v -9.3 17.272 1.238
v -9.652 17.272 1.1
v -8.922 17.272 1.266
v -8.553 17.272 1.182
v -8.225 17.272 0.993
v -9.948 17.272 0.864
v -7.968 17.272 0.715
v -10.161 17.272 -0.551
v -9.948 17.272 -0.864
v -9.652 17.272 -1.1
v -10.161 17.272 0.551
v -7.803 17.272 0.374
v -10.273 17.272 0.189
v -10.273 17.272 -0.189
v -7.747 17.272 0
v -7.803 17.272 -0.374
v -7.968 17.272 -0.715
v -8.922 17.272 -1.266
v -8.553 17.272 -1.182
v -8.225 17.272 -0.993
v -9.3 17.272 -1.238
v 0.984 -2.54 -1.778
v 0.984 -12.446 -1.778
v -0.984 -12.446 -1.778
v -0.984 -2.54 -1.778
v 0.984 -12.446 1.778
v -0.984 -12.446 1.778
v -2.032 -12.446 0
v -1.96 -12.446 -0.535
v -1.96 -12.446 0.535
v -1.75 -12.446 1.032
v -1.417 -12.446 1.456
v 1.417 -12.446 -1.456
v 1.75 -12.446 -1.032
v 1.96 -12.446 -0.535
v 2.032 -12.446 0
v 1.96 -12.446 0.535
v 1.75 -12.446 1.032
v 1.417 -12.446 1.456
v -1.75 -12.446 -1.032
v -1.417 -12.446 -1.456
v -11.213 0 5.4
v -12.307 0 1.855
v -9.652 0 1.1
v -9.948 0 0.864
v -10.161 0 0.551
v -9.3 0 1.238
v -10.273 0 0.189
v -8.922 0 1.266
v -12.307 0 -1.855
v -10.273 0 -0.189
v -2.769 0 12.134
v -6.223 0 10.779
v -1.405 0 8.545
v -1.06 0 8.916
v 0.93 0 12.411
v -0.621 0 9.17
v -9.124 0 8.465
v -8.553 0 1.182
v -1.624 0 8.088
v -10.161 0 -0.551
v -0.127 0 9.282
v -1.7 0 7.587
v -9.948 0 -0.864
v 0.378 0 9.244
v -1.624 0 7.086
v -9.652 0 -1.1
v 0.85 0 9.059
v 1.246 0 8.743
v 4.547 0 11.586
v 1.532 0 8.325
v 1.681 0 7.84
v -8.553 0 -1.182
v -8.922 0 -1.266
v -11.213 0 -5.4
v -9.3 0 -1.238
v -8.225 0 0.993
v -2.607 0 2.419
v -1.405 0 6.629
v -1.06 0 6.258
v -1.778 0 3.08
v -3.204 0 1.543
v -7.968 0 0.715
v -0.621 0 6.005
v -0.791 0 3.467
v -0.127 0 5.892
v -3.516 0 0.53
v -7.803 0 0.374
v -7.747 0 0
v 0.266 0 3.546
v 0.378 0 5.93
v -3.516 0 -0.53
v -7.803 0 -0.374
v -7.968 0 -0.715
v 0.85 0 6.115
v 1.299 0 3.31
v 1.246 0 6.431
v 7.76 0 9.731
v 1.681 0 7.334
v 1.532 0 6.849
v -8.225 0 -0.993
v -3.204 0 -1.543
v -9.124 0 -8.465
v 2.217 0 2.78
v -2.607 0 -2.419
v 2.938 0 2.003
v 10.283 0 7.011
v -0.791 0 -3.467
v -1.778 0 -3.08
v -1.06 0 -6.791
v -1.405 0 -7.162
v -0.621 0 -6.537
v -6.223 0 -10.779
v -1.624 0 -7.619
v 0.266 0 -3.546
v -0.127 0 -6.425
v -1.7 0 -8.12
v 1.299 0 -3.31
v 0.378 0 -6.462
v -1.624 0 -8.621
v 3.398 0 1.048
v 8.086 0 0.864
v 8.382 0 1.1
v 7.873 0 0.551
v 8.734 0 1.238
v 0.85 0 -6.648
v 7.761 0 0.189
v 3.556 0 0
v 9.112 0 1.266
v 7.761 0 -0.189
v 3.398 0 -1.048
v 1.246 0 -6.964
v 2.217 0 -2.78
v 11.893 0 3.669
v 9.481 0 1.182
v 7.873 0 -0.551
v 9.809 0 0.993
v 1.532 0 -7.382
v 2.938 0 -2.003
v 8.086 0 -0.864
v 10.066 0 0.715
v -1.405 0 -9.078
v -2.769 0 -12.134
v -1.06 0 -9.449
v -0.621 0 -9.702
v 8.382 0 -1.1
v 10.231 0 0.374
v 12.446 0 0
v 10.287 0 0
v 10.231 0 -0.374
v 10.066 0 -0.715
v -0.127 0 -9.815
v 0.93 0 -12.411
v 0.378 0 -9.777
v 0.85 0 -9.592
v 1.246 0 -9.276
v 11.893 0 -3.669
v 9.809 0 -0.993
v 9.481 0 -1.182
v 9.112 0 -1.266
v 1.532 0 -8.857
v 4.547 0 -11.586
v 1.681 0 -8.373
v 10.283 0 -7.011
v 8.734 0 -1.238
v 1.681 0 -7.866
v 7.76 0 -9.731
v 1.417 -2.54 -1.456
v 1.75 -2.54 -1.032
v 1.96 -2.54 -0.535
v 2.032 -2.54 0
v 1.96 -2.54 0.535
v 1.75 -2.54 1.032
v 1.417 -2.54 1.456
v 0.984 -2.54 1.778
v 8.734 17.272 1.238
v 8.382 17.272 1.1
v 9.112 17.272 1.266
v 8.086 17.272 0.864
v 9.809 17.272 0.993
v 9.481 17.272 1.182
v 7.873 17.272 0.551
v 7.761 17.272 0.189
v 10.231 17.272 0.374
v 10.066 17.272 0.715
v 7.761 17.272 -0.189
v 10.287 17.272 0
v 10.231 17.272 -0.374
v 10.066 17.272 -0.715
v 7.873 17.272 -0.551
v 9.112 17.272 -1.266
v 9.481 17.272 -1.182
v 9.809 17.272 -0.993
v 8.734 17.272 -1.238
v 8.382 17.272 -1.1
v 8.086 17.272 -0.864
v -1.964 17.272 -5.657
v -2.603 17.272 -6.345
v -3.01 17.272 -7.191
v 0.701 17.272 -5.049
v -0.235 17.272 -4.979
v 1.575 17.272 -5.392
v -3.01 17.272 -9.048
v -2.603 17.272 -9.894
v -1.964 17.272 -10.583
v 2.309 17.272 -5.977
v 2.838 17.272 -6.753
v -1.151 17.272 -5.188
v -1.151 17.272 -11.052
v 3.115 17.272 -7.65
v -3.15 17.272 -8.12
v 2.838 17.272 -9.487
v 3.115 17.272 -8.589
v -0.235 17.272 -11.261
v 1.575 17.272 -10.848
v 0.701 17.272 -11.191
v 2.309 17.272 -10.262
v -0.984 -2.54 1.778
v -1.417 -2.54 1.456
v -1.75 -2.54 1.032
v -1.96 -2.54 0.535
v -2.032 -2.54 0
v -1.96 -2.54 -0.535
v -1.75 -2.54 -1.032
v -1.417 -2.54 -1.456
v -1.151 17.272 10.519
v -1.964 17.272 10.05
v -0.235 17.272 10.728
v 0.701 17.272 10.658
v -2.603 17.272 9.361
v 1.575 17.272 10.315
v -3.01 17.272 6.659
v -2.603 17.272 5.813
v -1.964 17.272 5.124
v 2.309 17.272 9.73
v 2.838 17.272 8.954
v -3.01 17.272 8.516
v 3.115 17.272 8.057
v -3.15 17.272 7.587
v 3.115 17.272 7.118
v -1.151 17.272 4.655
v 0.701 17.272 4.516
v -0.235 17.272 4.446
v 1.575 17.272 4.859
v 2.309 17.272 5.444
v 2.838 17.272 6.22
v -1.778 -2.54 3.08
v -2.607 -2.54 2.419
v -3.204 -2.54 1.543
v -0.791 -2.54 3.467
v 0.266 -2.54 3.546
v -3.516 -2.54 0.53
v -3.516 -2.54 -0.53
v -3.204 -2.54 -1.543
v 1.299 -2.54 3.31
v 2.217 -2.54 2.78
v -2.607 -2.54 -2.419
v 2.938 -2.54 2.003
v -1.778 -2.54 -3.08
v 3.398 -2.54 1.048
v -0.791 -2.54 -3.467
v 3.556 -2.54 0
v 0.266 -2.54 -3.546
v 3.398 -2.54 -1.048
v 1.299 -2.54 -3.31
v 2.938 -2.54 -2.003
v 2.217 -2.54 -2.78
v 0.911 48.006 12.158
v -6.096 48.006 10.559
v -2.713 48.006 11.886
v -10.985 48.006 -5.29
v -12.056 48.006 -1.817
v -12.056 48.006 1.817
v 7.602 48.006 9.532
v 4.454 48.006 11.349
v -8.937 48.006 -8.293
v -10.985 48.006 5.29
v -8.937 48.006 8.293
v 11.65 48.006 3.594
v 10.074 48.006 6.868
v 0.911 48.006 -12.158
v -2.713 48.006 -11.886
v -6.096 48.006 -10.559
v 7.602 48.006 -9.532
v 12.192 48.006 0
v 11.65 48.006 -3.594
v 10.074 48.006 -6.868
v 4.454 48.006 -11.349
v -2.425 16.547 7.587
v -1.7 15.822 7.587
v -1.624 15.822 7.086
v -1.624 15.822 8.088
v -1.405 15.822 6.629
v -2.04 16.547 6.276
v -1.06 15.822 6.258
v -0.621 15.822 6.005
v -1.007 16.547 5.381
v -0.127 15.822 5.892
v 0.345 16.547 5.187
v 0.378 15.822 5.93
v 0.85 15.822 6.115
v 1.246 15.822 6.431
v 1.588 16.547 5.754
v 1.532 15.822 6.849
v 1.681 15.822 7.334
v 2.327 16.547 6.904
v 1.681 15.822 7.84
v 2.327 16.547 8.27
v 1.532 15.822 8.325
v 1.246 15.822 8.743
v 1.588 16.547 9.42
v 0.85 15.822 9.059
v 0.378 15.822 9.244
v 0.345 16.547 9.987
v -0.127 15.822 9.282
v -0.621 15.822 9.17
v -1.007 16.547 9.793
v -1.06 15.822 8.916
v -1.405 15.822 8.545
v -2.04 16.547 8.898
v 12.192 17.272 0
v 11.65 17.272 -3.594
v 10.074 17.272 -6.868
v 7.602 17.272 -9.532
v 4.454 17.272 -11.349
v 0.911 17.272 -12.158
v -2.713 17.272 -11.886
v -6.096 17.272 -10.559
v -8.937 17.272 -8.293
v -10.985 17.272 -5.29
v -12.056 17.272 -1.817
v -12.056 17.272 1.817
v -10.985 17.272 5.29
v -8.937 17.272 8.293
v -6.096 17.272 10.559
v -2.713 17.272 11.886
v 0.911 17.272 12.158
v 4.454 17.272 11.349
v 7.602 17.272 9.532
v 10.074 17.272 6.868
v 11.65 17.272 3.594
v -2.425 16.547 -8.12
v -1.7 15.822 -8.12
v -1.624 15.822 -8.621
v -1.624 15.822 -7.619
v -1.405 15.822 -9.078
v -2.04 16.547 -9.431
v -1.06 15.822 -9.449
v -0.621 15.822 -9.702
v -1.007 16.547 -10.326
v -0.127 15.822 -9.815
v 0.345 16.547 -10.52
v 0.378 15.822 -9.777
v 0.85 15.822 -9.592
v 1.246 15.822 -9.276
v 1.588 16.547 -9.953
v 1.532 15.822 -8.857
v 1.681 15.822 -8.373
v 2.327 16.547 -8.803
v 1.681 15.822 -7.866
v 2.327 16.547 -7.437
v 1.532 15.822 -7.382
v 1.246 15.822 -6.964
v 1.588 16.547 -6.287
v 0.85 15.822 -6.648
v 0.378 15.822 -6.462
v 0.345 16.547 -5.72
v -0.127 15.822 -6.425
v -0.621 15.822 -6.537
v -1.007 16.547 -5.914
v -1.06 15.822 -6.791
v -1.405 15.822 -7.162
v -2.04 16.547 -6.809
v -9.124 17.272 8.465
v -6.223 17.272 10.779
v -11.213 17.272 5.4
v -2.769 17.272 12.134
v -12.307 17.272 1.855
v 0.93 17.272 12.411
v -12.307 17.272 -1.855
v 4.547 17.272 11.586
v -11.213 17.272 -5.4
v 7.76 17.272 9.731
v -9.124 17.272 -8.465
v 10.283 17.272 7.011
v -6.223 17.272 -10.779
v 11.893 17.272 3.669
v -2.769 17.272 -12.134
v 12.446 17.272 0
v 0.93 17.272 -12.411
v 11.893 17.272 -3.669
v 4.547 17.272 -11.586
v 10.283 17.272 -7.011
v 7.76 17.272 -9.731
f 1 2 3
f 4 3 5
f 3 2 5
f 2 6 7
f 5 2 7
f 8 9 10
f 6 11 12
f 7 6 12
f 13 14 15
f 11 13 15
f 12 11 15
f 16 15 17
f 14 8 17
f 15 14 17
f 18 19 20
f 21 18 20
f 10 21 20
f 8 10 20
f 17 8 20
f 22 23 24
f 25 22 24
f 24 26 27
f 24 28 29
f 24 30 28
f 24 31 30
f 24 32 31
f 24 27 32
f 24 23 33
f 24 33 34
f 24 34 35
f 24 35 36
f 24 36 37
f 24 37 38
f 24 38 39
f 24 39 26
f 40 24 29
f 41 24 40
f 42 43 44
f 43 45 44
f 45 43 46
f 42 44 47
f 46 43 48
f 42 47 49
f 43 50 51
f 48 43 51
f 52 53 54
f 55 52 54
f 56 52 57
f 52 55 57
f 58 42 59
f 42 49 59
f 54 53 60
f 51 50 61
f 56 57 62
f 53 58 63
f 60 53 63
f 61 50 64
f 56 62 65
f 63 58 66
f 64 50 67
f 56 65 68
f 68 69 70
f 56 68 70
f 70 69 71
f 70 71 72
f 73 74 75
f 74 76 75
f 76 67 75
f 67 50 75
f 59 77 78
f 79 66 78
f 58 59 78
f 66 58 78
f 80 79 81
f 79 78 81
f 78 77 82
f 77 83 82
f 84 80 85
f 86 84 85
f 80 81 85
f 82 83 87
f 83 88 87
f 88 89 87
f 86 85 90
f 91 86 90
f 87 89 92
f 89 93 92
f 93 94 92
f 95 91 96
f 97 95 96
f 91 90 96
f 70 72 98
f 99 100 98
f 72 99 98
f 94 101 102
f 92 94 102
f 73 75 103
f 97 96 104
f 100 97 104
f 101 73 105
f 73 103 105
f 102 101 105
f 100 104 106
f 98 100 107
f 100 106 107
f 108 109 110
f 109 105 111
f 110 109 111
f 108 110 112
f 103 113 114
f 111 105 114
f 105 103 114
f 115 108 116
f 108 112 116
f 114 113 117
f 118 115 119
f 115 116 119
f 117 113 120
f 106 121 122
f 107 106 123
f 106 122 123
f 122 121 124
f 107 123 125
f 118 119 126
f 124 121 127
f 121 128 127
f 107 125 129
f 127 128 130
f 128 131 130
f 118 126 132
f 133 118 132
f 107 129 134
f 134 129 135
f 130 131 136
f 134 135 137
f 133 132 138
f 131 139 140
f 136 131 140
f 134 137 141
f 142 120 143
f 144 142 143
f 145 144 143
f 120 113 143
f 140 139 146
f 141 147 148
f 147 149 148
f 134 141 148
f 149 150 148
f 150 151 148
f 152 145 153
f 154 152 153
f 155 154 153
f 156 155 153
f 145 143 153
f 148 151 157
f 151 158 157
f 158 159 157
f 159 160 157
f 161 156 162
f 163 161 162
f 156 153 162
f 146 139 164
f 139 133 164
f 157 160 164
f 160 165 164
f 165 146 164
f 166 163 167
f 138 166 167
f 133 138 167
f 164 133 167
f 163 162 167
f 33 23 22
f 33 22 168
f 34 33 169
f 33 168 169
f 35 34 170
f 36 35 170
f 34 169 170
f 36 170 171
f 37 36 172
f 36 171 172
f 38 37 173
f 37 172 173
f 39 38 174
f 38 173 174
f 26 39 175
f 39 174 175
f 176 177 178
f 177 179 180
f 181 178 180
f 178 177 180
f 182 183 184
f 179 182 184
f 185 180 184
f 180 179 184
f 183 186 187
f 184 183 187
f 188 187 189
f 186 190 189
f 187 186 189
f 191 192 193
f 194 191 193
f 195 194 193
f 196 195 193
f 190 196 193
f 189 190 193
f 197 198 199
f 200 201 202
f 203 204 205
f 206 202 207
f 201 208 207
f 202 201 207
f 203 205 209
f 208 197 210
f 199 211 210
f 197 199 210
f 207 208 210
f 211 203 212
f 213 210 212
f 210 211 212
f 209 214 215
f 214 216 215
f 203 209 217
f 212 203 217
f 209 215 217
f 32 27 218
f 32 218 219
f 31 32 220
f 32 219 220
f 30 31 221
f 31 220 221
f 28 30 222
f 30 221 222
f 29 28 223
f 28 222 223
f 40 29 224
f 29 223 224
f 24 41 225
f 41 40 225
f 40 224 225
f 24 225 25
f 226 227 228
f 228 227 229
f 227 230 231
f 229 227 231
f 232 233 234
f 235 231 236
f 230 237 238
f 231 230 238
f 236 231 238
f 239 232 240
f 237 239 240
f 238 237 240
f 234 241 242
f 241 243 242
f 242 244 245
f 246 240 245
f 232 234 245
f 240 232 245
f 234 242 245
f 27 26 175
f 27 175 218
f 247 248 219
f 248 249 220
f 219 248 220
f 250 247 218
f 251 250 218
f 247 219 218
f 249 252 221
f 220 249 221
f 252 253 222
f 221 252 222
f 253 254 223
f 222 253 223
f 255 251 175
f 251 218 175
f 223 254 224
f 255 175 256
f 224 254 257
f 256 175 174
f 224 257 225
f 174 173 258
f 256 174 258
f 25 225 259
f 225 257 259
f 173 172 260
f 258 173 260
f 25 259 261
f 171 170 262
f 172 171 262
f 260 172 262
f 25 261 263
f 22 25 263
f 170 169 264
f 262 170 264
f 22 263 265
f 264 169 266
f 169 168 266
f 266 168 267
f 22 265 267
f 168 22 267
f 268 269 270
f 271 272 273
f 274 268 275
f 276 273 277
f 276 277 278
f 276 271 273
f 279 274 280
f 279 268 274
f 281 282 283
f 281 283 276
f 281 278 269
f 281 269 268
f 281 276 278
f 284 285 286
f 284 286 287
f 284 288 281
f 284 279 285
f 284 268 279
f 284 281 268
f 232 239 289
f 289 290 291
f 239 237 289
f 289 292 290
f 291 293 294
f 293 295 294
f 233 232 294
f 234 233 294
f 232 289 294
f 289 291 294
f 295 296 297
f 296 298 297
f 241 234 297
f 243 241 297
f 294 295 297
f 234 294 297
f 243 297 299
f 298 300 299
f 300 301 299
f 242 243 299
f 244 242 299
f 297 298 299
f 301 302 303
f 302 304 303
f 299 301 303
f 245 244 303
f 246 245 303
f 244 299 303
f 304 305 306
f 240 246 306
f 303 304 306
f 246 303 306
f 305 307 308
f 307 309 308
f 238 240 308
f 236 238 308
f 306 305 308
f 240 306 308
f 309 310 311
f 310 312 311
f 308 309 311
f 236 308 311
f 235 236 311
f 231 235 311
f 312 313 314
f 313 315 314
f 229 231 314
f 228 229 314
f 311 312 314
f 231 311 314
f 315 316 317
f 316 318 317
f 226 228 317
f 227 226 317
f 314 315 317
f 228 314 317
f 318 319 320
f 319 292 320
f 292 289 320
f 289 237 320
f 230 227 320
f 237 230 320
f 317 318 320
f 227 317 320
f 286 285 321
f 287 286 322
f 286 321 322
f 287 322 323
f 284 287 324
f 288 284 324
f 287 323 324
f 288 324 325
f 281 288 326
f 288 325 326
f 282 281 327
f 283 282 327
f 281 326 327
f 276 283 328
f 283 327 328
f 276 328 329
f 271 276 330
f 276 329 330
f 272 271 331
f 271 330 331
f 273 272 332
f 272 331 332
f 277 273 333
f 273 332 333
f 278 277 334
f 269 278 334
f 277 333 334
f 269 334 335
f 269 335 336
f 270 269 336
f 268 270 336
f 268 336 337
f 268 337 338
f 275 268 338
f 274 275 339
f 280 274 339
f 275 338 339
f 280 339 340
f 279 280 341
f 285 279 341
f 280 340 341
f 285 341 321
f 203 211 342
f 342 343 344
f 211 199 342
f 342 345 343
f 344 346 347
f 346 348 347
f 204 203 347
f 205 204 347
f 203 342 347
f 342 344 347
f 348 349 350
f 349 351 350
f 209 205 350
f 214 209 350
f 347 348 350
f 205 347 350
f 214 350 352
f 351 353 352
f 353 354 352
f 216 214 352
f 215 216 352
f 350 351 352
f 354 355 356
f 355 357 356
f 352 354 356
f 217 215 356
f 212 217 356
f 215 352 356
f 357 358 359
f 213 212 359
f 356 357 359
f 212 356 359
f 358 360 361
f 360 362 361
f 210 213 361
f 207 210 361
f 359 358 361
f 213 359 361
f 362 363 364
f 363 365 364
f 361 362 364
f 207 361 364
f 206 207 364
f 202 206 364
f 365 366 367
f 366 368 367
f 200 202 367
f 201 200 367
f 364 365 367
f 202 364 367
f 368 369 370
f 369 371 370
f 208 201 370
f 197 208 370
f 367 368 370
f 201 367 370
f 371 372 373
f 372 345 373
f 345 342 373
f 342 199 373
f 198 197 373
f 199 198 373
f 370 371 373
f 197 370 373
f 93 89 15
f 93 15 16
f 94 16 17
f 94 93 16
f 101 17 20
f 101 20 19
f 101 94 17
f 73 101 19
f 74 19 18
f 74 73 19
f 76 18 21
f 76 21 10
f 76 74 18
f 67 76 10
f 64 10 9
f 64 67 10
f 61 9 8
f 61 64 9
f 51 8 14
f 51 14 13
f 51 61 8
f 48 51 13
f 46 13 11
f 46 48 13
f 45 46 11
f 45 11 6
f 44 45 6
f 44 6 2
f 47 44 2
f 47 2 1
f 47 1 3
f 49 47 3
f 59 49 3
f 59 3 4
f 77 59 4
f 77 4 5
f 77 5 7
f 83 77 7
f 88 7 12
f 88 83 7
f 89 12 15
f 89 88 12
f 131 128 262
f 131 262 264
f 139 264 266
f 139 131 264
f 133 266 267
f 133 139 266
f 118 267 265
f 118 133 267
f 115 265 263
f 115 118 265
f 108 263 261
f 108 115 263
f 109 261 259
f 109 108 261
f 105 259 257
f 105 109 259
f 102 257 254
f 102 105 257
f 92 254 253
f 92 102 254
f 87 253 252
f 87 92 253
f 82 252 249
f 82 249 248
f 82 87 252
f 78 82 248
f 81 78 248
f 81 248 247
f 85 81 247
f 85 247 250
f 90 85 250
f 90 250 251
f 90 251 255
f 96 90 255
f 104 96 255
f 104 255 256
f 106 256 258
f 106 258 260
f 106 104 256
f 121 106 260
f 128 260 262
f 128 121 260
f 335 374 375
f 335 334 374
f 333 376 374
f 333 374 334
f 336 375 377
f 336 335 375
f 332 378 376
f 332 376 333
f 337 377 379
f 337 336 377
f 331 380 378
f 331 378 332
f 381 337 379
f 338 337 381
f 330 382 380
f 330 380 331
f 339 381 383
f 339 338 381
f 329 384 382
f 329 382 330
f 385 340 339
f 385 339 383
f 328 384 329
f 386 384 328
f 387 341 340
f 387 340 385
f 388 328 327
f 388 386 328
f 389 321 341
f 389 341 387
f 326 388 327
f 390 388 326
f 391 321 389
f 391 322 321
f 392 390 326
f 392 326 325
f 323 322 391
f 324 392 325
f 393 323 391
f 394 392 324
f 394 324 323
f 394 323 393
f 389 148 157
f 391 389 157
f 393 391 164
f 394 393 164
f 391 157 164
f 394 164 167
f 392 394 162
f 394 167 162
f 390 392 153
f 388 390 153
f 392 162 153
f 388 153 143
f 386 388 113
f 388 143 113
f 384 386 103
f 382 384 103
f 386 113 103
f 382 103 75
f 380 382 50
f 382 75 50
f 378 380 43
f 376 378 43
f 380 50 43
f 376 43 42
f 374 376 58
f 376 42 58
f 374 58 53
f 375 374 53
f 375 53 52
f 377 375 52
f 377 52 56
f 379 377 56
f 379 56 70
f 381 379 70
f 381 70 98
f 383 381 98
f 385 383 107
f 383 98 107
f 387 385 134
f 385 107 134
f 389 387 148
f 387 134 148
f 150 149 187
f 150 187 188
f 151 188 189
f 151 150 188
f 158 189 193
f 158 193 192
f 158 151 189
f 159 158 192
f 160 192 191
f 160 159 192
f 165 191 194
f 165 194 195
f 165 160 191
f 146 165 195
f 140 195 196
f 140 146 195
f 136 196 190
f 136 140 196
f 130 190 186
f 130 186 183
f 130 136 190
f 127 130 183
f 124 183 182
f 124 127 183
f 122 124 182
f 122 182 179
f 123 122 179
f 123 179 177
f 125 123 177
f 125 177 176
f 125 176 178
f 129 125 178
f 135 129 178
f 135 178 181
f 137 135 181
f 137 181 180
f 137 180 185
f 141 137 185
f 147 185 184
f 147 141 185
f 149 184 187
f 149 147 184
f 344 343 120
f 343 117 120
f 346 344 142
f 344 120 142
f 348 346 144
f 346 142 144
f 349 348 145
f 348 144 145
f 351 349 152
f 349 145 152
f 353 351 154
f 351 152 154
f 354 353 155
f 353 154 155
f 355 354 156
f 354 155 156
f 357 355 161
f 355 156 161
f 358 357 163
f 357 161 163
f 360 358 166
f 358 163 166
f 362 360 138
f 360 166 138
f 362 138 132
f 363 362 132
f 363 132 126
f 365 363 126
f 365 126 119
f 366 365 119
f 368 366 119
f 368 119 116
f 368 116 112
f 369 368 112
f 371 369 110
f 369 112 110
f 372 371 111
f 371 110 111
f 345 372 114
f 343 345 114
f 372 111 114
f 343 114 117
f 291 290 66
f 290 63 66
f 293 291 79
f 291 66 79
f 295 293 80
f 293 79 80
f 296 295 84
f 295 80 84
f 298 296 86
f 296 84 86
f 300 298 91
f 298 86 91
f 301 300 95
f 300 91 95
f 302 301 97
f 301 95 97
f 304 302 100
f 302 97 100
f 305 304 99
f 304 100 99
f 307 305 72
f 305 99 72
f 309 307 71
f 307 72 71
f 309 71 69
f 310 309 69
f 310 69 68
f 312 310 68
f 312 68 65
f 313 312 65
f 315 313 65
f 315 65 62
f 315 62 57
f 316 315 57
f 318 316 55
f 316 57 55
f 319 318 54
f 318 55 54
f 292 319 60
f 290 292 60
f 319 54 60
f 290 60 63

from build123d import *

# Parameters (mm, degrees)
SKETCH1_R                                       = 12.446
SKETCH1_R_2                                     = 1.27
BOSS_EXTRUDE1_DEPTH                             = 17.272
CSK_FOR_M3_FLAT_HEAD_MACHINE_SCREW1_D           = 3.4
CSK_FOR_M3_FLAT_HEAD_MACHINE_SCREW1_CSINK_D     = 6.3
CSK_FOR_M3_FLAT_HEAD_MACHINE_SCREW1_CSINK_ANGLE = 90
SKETCH5_R                                       = 12.192
BOSS_EXTRUDE2_DEPTH                             = 30.734
SKETCH6_R                                       = 3.556
BOSS_EXTRUDE3_DEPTH                             = 2.54
SKETCH7_R                                       = 2.032
BOSS_EXTRUDE4_DEPTH                             = 9.906
SKETCH8_W                                       = 2.032
SKETCH8_H                                       = 0.254
CUT_EXTRUDE2_DEPTH                              = 9.906


with BuildPart() as part:
    # Sketch1 → Boss-Extrude1 (new body)
    with BuildSketch(Plane(origin=(0, 0, 0), x_dir=(1, 0, 0), z_dir=(0, 1, 0))):
        Circle(SKETCH1_R)
        with Locations((-9.017, 0)):
            Circle(SKETCH1_R_2, mode=Mode.SUBTRACT)
        with Locations((9.017, 0)):
            Circle(SKETCH1_R_2, mode=Mode.SUBTRACT)
    extrude(amount=BOSS_EXTRUDE1_DEPTH)

    # CSK for M3 Flat Head Machine Screw1 (through all)
    with Locations(Plane(origin=(0, 17.272, 0), x_dir=(1, 0, 0), z_dir=(0, 1, 0))):
        with Locations((0, 8.119865968), (0, -7.587036194)):
            CounterSinkHole(CSK_FOR_M3_FLAT_HEAD_MACHINE_SCREW1_D / 2, CSK_FOR_M3_FLAT_HEAD_MACHINE_SCREW1_CSINK_D / 2, counter_sink_angle=CSK_FOR_M3_FLAT_HEAD_MACHINE_SCREW1_CSINK_ANGLE)

    # Sketch5 → Boss-Extrude2 (add)
    with BuildSketch(Plane(origin=(0, 17.272, 0), x_dir=(1, 0, 0), z_dir=(0, 1, 0))):
        Circle(SKETCH5_R)
    extrude(amount=BOSS_EXTRUDE2_DEPTH)

    # Sketch6 → Boss-Extrude3 (add)
    with BuildSketch(Plane(origin=(0, 0, 0), x_dir=(1, 0, 0), z_dir=(0, 1, 0))):
        Circle(SKETCH6_R)
    extrude(amount=-BOSS_EXTRUDE3_DEPTH)

    # Sketch7 → Boss-Extrude4 (add)
    with BuildSketch(Plane(origin=(0, -2.54, 0), x_dir=(-1, 0, 0), z_dir=(0, -1, 0))):
        Circle(SKETCH7_R)
    extrude(amount=BOSS_EXTRUDE4_DEPTH)

    # Sketch8 → Cut-Extrude2 (cut)
    with BuildSketch(Plane(origin=(0, -12.446, 0), x_dir=(-1, 0, 0), z_dir=(0, -1, 0))):
        with Locations((0, -1.905)):
            Rectangle(SKETCH8_W, SKETCH8_H)
        with Locations((0, 1.905)):
            Rectangle(SKETCH8_W, SKETCH8_H)
    extrude(amount=-CUT_EXTRUDE2_DEPTH, mode=Mode.SUBTRACT)


solid = part.part
